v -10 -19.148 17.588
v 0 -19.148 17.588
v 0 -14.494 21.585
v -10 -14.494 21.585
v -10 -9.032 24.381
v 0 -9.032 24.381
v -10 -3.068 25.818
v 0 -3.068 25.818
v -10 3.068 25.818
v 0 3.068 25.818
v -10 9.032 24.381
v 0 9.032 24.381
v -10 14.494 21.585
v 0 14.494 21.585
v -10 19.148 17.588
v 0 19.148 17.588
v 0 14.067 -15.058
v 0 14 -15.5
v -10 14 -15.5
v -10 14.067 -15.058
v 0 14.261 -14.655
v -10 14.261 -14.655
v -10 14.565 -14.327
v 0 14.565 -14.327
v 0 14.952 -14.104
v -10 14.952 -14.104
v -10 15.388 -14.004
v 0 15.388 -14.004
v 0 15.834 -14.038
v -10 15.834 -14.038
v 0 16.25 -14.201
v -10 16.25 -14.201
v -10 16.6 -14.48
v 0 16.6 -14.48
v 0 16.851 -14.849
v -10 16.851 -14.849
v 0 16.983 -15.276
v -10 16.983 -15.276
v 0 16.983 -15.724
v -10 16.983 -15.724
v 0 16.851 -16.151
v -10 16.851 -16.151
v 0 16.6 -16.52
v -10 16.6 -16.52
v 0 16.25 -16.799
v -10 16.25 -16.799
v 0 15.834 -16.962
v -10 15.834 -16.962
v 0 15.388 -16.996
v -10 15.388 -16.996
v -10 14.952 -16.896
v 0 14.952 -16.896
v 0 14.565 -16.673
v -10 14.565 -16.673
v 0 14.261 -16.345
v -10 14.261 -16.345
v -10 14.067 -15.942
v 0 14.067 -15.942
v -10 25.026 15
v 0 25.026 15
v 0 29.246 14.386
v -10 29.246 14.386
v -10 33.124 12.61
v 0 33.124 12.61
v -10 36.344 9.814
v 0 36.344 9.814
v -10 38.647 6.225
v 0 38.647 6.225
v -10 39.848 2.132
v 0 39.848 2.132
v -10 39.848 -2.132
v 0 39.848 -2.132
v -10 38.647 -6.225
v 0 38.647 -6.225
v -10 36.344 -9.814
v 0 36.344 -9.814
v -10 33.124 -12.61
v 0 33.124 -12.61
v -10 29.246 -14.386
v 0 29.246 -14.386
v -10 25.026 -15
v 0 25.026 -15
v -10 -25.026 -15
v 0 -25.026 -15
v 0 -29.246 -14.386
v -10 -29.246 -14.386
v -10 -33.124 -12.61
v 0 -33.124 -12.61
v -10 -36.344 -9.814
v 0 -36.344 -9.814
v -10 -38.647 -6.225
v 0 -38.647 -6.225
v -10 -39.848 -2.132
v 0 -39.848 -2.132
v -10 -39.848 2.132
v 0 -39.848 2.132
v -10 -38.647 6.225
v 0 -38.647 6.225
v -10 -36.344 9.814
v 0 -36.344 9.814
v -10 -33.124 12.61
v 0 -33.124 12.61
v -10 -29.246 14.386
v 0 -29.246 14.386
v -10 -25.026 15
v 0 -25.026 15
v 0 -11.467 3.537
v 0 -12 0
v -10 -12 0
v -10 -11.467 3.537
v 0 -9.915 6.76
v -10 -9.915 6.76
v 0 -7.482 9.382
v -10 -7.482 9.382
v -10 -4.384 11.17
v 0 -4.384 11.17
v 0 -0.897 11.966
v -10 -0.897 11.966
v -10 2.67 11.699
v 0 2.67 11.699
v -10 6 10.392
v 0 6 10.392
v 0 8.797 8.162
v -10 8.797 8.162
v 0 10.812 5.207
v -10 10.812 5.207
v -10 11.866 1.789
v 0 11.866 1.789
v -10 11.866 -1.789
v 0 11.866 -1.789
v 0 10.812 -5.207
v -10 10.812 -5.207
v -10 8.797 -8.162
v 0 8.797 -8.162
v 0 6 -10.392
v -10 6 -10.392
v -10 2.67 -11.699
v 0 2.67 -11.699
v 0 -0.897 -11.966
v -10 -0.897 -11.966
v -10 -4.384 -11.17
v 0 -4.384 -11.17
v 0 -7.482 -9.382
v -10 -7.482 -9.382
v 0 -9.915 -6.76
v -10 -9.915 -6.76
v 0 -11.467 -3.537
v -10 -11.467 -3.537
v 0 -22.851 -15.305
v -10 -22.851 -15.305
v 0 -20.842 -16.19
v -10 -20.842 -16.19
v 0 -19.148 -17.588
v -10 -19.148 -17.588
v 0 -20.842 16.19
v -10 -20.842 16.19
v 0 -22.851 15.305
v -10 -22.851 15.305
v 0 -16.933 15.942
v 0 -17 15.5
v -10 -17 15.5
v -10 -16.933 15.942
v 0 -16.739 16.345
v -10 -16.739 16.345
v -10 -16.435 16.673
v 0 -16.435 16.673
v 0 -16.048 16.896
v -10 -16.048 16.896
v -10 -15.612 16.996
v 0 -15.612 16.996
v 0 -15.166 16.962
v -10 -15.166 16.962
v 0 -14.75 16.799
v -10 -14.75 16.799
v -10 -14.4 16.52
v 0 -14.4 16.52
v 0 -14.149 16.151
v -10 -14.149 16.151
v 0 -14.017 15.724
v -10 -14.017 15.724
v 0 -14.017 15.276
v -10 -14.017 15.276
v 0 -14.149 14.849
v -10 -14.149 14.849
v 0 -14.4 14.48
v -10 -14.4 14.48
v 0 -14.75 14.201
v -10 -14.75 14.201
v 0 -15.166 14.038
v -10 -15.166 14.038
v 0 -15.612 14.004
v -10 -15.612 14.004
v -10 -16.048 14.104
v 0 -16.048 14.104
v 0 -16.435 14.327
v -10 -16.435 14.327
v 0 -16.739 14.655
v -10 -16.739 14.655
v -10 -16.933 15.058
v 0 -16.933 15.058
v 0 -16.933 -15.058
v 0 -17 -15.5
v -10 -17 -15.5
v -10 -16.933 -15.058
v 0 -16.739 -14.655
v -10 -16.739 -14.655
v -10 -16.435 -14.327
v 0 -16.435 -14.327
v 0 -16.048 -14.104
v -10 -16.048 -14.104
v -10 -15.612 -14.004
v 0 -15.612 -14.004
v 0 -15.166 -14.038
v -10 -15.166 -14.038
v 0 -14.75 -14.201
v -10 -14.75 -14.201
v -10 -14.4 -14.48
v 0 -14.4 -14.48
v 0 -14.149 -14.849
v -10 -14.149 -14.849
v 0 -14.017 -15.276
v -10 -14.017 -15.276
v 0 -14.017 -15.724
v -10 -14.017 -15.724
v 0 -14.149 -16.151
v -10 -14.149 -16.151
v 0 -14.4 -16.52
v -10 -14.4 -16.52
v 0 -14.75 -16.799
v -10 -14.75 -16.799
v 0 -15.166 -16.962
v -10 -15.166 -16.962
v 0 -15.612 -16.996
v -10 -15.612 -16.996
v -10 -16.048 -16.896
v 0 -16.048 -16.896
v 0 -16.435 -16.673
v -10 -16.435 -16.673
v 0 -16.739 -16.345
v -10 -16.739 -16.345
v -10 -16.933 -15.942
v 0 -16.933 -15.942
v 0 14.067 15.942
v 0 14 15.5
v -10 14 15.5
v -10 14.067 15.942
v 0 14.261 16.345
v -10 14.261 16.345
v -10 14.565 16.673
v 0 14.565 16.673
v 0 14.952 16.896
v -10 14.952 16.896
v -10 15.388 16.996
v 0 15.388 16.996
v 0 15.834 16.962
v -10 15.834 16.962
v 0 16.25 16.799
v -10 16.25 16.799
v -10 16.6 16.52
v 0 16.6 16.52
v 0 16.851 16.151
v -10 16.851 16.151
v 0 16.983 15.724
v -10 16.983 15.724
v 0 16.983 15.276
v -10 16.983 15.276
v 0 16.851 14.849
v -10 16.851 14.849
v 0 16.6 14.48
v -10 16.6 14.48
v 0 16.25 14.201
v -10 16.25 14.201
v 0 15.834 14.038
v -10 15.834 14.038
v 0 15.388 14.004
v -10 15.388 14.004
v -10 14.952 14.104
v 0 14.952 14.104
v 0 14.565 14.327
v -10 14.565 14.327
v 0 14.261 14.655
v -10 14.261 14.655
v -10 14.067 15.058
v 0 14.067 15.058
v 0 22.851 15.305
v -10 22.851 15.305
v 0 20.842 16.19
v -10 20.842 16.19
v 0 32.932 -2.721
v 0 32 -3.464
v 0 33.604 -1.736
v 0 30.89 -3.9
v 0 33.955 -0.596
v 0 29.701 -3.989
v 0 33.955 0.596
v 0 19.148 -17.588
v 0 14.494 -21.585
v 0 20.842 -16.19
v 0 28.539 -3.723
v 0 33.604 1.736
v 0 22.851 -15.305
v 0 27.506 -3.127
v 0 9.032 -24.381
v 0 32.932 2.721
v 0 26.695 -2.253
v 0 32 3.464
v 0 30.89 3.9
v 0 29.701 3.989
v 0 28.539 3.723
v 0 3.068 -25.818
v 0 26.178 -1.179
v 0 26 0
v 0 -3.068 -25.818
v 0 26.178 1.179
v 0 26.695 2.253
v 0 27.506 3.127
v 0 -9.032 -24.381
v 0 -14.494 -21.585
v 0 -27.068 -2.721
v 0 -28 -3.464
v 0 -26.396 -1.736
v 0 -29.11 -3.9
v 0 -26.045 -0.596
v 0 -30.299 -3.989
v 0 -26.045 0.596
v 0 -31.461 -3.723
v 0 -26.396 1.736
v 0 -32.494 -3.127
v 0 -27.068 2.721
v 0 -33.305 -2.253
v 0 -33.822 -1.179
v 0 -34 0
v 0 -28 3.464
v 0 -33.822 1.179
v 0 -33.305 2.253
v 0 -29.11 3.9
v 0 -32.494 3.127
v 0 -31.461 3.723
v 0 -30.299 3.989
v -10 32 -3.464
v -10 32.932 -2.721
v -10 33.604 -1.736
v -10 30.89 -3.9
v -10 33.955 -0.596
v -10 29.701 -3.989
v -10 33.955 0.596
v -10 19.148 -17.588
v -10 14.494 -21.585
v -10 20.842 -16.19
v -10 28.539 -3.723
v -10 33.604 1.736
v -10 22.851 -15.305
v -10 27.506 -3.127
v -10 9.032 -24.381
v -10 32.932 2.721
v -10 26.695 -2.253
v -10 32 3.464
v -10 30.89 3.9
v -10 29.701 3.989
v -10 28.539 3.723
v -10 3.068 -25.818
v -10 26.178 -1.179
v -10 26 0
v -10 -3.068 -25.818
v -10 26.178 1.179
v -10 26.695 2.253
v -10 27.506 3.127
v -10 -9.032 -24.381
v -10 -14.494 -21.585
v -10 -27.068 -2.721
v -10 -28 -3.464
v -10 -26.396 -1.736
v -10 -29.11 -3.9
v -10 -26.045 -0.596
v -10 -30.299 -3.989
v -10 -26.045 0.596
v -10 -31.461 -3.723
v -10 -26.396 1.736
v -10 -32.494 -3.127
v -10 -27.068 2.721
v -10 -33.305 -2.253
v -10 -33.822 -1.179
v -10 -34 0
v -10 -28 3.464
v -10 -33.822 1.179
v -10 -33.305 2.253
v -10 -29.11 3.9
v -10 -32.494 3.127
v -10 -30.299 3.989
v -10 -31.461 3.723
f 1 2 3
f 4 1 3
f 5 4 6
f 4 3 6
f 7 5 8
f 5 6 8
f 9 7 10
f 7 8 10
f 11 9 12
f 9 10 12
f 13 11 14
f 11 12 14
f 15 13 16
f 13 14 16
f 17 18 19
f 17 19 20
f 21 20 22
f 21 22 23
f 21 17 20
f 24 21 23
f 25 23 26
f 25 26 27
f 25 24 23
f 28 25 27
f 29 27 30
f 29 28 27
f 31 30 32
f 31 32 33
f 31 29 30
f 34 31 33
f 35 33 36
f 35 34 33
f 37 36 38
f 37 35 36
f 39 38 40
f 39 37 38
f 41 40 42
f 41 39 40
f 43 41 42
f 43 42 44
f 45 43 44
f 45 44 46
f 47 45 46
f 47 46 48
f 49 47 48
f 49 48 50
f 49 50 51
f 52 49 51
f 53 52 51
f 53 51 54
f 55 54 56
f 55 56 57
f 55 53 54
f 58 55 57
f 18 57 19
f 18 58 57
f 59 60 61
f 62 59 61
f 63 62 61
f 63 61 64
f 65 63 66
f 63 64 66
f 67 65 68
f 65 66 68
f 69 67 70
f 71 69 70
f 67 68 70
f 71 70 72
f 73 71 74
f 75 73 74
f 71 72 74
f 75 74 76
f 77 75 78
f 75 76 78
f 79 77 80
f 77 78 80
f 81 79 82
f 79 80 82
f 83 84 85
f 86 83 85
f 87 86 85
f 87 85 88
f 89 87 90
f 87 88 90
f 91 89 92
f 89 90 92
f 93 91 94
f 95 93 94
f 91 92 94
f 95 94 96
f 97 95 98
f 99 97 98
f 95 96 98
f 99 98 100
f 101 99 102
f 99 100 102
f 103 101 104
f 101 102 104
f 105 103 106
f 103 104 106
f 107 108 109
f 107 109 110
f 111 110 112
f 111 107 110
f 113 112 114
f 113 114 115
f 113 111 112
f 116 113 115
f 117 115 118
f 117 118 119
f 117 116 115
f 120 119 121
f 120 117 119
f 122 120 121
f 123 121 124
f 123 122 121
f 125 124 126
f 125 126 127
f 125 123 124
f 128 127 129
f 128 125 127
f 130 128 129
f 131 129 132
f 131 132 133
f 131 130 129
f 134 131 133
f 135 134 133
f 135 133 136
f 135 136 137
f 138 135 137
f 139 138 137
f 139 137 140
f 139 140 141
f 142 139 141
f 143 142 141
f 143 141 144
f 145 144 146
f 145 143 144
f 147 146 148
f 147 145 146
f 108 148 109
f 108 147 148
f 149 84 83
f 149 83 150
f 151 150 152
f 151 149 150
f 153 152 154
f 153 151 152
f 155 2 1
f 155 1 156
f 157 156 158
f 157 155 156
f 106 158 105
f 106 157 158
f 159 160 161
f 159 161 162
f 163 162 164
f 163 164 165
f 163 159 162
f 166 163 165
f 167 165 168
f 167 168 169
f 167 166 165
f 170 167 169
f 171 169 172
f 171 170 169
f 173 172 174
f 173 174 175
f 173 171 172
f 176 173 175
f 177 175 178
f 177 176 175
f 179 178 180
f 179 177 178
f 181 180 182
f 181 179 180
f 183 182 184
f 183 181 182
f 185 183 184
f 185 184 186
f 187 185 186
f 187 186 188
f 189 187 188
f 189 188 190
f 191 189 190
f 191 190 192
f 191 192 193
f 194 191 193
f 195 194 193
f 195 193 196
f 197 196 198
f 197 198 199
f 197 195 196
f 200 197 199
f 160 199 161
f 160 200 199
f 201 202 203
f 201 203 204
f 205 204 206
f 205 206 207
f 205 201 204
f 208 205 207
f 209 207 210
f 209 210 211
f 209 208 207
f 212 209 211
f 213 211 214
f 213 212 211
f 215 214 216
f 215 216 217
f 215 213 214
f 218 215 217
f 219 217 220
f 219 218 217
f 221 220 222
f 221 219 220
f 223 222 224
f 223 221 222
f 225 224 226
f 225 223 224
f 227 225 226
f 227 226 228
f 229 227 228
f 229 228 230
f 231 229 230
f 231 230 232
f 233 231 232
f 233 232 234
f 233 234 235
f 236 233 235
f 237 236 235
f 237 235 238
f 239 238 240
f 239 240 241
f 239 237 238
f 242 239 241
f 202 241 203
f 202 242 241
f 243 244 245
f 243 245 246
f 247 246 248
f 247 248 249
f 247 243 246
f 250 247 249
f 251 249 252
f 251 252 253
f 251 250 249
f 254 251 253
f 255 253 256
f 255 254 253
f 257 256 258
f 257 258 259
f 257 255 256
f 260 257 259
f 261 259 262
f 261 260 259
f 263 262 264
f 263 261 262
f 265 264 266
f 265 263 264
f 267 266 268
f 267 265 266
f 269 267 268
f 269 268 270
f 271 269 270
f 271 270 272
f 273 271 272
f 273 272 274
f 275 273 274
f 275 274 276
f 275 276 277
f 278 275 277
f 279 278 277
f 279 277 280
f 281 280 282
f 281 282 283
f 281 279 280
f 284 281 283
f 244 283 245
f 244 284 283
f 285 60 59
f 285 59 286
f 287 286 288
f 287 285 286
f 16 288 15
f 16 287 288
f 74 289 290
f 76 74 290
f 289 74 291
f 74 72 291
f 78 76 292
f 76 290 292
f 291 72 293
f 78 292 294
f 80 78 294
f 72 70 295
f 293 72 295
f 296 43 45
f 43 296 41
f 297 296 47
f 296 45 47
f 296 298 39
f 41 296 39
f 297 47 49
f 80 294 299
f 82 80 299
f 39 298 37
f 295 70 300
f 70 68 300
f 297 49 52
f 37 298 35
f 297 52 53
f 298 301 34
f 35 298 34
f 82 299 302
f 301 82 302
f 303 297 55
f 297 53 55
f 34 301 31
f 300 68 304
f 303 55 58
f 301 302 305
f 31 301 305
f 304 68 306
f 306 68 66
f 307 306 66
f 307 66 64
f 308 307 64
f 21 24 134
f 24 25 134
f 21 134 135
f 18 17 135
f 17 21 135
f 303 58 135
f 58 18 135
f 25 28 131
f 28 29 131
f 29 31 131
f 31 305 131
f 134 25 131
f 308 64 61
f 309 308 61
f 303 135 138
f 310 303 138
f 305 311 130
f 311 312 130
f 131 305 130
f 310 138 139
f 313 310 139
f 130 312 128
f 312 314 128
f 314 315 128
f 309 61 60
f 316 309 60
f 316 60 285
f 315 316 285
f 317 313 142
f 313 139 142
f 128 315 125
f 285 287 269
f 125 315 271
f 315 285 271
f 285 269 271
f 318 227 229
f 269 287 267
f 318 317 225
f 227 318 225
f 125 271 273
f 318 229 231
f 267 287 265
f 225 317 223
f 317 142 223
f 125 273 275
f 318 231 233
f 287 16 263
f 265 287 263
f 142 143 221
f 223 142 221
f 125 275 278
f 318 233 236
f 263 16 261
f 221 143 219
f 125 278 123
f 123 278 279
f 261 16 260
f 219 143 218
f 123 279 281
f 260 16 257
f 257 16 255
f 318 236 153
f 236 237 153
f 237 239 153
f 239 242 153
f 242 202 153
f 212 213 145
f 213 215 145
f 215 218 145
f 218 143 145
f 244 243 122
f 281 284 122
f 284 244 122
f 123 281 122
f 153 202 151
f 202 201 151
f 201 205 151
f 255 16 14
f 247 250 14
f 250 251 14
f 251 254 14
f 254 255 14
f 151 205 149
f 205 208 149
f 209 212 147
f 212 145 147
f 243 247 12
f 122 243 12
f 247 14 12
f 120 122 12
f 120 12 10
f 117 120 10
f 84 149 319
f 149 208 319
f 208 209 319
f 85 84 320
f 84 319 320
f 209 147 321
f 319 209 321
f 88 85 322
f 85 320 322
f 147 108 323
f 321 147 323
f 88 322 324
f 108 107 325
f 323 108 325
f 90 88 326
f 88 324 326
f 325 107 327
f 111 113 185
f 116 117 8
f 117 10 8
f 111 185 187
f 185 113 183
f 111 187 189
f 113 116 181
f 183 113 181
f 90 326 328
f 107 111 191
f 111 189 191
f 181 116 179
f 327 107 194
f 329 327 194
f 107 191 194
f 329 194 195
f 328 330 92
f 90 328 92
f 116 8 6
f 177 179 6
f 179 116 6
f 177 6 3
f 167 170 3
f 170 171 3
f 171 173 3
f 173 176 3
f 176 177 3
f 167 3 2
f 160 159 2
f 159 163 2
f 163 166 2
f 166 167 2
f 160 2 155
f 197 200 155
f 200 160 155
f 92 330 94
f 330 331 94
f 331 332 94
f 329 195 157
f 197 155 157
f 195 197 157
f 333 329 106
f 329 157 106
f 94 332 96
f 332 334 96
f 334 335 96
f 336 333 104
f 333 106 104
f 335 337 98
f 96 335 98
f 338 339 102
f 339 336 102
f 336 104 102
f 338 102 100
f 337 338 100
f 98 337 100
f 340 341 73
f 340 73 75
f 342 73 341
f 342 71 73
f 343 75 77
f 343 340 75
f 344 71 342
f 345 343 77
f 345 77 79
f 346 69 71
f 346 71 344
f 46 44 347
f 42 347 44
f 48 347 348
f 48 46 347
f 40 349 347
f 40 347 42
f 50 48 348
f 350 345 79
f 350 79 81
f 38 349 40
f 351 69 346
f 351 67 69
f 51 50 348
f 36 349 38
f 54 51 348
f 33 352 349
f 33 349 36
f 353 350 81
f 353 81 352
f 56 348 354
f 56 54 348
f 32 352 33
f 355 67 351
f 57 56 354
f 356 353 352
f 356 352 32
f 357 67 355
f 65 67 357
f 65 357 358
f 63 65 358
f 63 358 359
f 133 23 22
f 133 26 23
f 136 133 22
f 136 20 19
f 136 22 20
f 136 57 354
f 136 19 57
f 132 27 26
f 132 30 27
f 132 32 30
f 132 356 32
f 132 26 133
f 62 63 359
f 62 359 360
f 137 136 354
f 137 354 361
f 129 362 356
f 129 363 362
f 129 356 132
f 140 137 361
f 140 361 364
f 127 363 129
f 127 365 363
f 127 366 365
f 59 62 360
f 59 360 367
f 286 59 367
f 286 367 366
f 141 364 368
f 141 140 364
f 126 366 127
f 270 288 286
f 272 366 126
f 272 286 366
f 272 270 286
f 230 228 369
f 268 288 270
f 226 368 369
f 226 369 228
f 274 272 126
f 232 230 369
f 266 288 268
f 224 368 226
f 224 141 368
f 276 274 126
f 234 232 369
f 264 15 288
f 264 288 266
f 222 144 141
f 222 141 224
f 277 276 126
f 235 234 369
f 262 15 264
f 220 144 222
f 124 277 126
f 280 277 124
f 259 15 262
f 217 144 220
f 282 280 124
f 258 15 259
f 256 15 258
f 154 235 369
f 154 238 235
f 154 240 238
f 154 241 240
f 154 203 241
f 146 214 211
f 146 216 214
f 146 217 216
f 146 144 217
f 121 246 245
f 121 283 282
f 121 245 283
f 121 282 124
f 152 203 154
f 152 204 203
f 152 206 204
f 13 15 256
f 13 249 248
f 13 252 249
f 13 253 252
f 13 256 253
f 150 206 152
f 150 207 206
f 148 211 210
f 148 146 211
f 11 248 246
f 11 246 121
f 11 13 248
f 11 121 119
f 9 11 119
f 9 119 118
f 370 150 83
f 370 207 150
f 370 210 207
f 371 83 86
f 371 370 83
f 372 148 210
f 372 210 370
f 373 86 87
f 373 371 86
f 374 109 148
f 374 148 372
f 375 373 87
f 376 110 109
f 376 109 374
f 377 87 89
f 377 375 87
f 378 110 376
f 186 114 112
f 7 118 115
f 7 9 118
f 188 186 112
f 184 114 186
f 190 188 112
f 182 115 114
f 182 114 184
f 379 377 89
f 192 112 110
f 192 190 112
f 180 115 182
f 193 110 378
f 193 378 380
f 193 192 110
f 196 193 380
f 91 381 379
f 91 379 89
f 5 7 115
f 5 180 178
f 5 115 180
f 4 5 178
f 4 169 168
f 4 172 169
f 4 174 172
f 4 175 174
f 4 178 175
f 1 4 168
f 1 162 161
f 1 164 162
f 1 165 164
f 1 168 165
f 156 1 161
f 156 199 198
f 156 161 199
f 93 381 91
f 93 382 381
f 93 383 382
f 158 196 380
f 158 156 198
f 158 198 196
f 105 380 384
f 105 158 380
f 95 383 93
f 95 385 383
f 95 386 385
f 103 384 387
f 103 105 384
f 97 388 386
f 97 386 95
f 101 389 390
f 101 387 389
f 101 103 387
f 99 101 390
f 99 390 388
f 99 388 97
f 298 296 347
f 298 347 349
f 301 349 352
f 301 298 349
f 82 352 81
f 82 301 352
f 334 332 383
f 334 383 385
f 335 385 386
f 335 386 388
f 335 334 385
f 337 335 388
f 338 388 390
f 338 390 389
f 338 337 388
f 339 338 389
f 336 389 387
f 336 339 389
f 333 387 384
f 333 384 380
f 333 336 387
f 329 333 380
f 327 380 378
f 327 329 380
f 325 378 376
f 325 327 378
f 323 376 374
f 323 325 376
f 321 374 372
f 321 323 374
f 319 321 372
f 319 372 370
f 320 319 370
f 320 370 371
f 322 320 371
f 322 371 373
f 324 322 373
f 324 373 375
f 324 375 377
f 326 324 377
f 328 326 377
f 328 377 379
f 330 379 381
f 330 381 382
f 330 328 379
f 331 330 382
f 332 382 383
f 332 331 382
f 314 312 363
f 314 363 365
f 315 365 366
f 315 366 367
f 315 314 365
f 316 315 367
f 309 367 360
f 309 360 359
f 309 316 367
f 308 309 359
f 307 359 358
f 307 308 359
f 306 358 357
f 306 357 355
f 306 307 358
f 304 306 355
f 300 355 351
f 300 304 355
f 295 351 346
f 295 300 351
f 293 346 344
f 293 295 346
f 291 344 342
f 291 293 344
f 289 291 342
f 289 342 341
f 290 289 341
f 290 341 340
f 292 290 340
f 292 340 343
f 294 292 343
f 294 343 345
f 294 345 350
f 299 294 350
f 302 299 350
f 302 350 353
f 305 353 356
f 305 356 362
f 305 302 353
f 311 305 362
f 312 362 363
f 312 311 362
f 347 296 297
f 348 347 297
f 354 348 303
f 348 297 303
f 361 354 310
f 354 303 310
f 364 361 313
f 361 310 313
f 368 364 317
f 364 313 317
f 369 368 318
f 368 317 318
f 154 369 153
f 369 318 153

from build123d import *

# Parameters (mm, degrees)
SKETCH018_R   = 4
SKETCH018_R_2 = 1.5
SKETCH018_R_3 = 12
PAD_DEPTH     = 10


with BuildPart() as part:
    # Sketch018 → Pad (new body)
    with BuildSketch(Plane(origin=(0, 0, 0), x_dir=(0, -1, 0), z_dir=(-1, 0, 0))):
        with BuildLine():
            ThreePointArc((19.148224, 17.588221), (0, 26), (-19.148224, 17.588221))
            ThreePointArc((-25.026104, 14.999977), (-21.816028, 15.678353), (-19.148224, 17.588221))
            ThreePointArc((-25.026104, 14.999977), (-40, 0), (-25.026104, -14.999977))
            ThreePointArc((-19.148224, -17.588221), (-21.816028, -15.678353), (-25.026104, -14.999977))
            ThreePointArc((-19.148224, -17.588221), (0, -26), (19.148224, -17.588221))
            ThreePointArc((25.026104, -14.999977), (21.816028, -15.678353), (19.148224, -17.588221))
            ThreePointArc((25.026104, -14.999977), (40, 0), (25.026104, 14.999977))
            ThreePointArc((19.148224, 17.588221), (21.816028, 15.678353), (25.026104, 14.999977))
        make_face()
        with Locations((-30, 0)):
            Circle(SKETCH018_R, mode=Mode.SUBTRACT)
        with Locations((30, 0)):
            Circle(SKETCH018_R, mode=Mode.SUBTRACT)
        with Locations((-15.5, 15.5)):
            Circle(SKETCH018_R_2, mode=Mode.SUBTRACT)
        with Locations((15.5, 15.5)):
            Circle(SKETCH018_R_2, mode=Mode.SUBTRACT)
        with Locations((-15.5, -15.5)):
            Circle(SKETCH018_R_2, mode=Mode.SUBTRACT)
        with Locations((15.5, -15.5)):
            Circle(SKETCH018_R_2, mode=Mode.SUBTRACT)
        Circle(SKETCH018_R_3, mode=Mode.SUBTRACT)
    extrude(amount=PAD_DEPTH)


solid = part.part
